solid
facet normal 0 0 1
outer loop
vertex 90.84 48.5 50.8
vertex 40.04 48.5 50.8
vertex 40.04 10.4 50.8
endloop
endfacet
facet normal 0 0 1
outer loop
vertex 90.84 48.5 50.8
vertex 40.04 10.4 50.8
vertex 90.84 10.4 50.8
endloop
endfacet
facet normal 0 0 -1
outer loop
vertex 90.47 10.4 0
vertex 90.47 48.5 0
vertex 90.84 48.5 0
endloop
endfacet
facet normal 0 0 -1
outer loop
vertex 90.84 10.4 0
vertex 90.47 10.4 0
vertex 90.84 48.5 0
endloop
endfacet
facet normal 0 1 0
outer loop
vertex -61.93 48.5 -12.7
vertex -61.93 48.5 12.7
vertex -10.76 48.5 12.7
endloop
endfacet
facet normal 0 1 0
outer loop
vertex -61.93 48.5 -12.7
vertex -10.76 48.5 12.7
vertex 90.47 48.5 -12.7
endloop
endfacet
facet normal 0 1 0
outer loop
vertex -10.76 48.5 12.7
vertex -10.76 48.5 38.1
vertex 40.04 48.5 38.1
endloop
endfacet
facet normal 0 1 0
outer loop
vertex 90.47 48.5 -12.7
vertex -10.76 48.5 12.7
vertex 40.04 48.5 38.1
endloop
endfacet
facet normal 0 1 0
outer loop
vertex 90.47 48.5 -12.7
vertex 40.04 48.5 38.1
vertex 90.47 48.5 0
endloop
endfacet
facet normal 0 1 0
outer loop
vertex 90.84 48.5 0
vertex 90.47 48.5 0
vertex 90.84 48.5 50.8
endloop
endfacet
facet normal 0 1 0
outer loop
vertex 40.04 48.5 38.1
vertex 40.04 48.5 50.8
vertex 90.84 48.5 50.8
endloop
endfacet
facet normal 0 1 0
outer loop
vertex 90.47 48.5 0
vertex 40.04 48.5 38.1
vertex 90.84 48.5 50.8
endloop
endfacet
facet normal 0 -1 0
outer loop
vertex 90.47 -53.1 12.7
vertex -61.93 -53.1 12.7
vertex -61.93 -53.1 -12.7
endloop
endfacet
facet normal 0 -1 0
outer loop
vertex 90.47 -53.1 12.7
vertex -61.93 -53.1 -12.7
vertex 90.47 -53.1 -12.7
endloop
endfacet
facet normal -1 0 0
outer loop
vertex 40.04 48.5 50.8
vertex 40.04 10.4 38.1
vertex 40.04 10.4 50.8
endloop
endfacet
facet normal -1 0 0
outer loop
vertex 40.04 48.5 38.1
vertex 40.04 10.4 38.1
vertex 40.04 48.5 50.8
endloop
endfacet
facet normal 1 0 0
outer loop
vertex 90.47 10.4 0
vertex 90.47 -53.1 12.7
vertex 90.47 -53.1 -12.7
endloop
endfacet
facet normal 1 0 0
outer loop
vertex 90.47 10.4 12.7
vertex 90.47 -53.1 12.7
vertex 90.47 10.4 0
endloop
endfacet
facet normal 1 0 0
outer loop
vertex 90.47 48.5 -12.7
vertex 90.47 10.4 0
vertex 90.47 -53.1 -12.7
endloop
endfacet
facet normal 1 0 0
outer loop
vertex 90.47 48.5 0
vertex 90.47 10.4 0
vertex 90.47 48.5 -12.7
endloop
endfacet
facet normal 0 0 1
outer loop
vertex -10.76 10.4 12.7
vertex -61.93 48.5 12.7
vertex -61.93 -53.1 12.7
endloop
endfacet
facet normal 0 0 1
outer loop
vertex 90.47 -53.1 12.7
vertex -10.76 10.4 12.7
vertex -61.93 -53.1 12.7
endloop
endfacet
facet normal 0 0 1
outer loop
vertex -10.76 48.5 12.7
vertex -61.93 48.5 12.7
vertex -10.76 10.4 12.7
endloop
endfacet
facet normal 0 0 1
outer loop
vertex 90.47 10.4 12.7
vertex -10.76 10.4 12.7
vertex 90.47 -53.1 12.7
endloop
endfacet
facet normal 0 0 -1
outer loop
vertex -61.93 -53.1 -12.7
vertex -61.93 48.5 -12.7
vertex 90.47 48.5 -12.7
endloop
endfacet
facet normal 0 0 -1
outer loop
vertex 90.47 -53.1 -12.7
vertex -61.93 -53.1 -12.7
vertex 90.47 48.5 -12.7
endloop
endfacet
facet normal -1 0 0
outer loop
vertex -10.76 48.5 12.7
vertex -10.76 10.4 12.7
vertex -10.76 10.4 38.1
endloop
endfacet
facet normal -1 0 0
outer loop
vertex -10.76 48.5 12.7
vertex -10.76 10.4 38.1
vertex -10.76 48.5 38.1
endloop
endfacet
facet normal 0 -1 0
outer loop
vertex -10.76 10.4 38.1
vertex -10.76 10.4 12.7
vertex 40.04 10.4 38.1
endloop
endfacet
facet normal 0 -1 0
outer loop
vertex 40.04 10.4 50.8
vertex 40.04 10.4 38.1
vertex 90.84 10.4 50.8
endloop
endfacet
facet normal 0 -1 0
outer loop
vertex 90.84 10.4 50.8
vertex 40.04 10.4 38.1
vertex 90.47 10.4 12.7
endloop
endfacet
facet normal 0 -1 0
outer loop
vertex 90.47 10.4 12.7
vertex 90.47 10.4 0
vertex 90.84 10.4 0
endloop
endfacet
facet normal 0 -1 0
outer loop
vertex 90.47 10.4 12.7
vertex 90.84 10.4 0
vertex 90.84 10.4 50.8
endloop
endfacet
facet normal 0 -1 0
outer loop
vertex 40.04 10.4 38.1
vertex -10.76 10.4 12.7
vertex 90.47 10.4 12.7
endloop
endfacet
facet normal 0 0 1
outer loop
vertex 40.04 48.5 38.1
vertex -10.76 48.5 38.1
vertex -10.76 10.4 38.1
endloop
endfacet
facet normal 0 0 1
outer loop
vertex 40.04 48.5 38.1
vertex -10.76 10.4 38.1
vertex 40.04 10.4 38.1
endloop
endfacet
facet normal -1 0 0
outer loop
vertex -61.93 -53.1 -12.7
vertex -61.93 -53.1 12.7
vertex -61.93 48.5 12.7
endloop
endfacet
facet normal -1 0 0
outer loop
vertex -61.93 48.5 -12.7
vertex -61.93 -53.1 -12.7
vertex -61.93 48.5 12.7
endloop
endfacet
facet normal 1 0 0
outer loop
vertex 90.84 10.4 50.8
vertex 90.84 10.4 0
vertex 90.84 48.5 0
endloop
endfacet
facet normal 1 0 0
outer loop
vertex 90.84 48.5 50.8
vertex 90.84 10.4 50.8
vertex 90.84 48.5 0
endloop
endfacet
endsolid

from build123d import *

# Parameters (mm, degrees)
F0_W     = 152.4
F0_H     = 101.6
F1_DEPTH = 12.7
F2_W     = 50.8
F2_H     = 38.1
F3_DEPTH = 50.8
F4_DEPTH = 38.1


with BuildPart() as f1:
    # F0 (on Top) → F1 (new body, symmetric)
    with BuildSketch(Plane.XY):
        with Locations((14.2702582896, -2.3004743776)):
            Rectangle(F0_W, F0_H)
    extrude(amount=F1_DEPTH, both=True)

    # F2 (on Top) → F3 (join)
    with BuildSketch(Plane.XY):
        with Locations((65.439629665, 29.4495256224)):
            Rectangle(F2_W, F2_H)
    extrude(amount=F3_DEPTH)

    # F2 (on Top) → F4 (join)
    with BuildSketch(Plane.XY):
        with Locations((14.639629665, 29.4495256224)):
            Rectangle(F2_W, F2_H)
    extrude(amount=F4_DEPTH)


solid = f1.part
